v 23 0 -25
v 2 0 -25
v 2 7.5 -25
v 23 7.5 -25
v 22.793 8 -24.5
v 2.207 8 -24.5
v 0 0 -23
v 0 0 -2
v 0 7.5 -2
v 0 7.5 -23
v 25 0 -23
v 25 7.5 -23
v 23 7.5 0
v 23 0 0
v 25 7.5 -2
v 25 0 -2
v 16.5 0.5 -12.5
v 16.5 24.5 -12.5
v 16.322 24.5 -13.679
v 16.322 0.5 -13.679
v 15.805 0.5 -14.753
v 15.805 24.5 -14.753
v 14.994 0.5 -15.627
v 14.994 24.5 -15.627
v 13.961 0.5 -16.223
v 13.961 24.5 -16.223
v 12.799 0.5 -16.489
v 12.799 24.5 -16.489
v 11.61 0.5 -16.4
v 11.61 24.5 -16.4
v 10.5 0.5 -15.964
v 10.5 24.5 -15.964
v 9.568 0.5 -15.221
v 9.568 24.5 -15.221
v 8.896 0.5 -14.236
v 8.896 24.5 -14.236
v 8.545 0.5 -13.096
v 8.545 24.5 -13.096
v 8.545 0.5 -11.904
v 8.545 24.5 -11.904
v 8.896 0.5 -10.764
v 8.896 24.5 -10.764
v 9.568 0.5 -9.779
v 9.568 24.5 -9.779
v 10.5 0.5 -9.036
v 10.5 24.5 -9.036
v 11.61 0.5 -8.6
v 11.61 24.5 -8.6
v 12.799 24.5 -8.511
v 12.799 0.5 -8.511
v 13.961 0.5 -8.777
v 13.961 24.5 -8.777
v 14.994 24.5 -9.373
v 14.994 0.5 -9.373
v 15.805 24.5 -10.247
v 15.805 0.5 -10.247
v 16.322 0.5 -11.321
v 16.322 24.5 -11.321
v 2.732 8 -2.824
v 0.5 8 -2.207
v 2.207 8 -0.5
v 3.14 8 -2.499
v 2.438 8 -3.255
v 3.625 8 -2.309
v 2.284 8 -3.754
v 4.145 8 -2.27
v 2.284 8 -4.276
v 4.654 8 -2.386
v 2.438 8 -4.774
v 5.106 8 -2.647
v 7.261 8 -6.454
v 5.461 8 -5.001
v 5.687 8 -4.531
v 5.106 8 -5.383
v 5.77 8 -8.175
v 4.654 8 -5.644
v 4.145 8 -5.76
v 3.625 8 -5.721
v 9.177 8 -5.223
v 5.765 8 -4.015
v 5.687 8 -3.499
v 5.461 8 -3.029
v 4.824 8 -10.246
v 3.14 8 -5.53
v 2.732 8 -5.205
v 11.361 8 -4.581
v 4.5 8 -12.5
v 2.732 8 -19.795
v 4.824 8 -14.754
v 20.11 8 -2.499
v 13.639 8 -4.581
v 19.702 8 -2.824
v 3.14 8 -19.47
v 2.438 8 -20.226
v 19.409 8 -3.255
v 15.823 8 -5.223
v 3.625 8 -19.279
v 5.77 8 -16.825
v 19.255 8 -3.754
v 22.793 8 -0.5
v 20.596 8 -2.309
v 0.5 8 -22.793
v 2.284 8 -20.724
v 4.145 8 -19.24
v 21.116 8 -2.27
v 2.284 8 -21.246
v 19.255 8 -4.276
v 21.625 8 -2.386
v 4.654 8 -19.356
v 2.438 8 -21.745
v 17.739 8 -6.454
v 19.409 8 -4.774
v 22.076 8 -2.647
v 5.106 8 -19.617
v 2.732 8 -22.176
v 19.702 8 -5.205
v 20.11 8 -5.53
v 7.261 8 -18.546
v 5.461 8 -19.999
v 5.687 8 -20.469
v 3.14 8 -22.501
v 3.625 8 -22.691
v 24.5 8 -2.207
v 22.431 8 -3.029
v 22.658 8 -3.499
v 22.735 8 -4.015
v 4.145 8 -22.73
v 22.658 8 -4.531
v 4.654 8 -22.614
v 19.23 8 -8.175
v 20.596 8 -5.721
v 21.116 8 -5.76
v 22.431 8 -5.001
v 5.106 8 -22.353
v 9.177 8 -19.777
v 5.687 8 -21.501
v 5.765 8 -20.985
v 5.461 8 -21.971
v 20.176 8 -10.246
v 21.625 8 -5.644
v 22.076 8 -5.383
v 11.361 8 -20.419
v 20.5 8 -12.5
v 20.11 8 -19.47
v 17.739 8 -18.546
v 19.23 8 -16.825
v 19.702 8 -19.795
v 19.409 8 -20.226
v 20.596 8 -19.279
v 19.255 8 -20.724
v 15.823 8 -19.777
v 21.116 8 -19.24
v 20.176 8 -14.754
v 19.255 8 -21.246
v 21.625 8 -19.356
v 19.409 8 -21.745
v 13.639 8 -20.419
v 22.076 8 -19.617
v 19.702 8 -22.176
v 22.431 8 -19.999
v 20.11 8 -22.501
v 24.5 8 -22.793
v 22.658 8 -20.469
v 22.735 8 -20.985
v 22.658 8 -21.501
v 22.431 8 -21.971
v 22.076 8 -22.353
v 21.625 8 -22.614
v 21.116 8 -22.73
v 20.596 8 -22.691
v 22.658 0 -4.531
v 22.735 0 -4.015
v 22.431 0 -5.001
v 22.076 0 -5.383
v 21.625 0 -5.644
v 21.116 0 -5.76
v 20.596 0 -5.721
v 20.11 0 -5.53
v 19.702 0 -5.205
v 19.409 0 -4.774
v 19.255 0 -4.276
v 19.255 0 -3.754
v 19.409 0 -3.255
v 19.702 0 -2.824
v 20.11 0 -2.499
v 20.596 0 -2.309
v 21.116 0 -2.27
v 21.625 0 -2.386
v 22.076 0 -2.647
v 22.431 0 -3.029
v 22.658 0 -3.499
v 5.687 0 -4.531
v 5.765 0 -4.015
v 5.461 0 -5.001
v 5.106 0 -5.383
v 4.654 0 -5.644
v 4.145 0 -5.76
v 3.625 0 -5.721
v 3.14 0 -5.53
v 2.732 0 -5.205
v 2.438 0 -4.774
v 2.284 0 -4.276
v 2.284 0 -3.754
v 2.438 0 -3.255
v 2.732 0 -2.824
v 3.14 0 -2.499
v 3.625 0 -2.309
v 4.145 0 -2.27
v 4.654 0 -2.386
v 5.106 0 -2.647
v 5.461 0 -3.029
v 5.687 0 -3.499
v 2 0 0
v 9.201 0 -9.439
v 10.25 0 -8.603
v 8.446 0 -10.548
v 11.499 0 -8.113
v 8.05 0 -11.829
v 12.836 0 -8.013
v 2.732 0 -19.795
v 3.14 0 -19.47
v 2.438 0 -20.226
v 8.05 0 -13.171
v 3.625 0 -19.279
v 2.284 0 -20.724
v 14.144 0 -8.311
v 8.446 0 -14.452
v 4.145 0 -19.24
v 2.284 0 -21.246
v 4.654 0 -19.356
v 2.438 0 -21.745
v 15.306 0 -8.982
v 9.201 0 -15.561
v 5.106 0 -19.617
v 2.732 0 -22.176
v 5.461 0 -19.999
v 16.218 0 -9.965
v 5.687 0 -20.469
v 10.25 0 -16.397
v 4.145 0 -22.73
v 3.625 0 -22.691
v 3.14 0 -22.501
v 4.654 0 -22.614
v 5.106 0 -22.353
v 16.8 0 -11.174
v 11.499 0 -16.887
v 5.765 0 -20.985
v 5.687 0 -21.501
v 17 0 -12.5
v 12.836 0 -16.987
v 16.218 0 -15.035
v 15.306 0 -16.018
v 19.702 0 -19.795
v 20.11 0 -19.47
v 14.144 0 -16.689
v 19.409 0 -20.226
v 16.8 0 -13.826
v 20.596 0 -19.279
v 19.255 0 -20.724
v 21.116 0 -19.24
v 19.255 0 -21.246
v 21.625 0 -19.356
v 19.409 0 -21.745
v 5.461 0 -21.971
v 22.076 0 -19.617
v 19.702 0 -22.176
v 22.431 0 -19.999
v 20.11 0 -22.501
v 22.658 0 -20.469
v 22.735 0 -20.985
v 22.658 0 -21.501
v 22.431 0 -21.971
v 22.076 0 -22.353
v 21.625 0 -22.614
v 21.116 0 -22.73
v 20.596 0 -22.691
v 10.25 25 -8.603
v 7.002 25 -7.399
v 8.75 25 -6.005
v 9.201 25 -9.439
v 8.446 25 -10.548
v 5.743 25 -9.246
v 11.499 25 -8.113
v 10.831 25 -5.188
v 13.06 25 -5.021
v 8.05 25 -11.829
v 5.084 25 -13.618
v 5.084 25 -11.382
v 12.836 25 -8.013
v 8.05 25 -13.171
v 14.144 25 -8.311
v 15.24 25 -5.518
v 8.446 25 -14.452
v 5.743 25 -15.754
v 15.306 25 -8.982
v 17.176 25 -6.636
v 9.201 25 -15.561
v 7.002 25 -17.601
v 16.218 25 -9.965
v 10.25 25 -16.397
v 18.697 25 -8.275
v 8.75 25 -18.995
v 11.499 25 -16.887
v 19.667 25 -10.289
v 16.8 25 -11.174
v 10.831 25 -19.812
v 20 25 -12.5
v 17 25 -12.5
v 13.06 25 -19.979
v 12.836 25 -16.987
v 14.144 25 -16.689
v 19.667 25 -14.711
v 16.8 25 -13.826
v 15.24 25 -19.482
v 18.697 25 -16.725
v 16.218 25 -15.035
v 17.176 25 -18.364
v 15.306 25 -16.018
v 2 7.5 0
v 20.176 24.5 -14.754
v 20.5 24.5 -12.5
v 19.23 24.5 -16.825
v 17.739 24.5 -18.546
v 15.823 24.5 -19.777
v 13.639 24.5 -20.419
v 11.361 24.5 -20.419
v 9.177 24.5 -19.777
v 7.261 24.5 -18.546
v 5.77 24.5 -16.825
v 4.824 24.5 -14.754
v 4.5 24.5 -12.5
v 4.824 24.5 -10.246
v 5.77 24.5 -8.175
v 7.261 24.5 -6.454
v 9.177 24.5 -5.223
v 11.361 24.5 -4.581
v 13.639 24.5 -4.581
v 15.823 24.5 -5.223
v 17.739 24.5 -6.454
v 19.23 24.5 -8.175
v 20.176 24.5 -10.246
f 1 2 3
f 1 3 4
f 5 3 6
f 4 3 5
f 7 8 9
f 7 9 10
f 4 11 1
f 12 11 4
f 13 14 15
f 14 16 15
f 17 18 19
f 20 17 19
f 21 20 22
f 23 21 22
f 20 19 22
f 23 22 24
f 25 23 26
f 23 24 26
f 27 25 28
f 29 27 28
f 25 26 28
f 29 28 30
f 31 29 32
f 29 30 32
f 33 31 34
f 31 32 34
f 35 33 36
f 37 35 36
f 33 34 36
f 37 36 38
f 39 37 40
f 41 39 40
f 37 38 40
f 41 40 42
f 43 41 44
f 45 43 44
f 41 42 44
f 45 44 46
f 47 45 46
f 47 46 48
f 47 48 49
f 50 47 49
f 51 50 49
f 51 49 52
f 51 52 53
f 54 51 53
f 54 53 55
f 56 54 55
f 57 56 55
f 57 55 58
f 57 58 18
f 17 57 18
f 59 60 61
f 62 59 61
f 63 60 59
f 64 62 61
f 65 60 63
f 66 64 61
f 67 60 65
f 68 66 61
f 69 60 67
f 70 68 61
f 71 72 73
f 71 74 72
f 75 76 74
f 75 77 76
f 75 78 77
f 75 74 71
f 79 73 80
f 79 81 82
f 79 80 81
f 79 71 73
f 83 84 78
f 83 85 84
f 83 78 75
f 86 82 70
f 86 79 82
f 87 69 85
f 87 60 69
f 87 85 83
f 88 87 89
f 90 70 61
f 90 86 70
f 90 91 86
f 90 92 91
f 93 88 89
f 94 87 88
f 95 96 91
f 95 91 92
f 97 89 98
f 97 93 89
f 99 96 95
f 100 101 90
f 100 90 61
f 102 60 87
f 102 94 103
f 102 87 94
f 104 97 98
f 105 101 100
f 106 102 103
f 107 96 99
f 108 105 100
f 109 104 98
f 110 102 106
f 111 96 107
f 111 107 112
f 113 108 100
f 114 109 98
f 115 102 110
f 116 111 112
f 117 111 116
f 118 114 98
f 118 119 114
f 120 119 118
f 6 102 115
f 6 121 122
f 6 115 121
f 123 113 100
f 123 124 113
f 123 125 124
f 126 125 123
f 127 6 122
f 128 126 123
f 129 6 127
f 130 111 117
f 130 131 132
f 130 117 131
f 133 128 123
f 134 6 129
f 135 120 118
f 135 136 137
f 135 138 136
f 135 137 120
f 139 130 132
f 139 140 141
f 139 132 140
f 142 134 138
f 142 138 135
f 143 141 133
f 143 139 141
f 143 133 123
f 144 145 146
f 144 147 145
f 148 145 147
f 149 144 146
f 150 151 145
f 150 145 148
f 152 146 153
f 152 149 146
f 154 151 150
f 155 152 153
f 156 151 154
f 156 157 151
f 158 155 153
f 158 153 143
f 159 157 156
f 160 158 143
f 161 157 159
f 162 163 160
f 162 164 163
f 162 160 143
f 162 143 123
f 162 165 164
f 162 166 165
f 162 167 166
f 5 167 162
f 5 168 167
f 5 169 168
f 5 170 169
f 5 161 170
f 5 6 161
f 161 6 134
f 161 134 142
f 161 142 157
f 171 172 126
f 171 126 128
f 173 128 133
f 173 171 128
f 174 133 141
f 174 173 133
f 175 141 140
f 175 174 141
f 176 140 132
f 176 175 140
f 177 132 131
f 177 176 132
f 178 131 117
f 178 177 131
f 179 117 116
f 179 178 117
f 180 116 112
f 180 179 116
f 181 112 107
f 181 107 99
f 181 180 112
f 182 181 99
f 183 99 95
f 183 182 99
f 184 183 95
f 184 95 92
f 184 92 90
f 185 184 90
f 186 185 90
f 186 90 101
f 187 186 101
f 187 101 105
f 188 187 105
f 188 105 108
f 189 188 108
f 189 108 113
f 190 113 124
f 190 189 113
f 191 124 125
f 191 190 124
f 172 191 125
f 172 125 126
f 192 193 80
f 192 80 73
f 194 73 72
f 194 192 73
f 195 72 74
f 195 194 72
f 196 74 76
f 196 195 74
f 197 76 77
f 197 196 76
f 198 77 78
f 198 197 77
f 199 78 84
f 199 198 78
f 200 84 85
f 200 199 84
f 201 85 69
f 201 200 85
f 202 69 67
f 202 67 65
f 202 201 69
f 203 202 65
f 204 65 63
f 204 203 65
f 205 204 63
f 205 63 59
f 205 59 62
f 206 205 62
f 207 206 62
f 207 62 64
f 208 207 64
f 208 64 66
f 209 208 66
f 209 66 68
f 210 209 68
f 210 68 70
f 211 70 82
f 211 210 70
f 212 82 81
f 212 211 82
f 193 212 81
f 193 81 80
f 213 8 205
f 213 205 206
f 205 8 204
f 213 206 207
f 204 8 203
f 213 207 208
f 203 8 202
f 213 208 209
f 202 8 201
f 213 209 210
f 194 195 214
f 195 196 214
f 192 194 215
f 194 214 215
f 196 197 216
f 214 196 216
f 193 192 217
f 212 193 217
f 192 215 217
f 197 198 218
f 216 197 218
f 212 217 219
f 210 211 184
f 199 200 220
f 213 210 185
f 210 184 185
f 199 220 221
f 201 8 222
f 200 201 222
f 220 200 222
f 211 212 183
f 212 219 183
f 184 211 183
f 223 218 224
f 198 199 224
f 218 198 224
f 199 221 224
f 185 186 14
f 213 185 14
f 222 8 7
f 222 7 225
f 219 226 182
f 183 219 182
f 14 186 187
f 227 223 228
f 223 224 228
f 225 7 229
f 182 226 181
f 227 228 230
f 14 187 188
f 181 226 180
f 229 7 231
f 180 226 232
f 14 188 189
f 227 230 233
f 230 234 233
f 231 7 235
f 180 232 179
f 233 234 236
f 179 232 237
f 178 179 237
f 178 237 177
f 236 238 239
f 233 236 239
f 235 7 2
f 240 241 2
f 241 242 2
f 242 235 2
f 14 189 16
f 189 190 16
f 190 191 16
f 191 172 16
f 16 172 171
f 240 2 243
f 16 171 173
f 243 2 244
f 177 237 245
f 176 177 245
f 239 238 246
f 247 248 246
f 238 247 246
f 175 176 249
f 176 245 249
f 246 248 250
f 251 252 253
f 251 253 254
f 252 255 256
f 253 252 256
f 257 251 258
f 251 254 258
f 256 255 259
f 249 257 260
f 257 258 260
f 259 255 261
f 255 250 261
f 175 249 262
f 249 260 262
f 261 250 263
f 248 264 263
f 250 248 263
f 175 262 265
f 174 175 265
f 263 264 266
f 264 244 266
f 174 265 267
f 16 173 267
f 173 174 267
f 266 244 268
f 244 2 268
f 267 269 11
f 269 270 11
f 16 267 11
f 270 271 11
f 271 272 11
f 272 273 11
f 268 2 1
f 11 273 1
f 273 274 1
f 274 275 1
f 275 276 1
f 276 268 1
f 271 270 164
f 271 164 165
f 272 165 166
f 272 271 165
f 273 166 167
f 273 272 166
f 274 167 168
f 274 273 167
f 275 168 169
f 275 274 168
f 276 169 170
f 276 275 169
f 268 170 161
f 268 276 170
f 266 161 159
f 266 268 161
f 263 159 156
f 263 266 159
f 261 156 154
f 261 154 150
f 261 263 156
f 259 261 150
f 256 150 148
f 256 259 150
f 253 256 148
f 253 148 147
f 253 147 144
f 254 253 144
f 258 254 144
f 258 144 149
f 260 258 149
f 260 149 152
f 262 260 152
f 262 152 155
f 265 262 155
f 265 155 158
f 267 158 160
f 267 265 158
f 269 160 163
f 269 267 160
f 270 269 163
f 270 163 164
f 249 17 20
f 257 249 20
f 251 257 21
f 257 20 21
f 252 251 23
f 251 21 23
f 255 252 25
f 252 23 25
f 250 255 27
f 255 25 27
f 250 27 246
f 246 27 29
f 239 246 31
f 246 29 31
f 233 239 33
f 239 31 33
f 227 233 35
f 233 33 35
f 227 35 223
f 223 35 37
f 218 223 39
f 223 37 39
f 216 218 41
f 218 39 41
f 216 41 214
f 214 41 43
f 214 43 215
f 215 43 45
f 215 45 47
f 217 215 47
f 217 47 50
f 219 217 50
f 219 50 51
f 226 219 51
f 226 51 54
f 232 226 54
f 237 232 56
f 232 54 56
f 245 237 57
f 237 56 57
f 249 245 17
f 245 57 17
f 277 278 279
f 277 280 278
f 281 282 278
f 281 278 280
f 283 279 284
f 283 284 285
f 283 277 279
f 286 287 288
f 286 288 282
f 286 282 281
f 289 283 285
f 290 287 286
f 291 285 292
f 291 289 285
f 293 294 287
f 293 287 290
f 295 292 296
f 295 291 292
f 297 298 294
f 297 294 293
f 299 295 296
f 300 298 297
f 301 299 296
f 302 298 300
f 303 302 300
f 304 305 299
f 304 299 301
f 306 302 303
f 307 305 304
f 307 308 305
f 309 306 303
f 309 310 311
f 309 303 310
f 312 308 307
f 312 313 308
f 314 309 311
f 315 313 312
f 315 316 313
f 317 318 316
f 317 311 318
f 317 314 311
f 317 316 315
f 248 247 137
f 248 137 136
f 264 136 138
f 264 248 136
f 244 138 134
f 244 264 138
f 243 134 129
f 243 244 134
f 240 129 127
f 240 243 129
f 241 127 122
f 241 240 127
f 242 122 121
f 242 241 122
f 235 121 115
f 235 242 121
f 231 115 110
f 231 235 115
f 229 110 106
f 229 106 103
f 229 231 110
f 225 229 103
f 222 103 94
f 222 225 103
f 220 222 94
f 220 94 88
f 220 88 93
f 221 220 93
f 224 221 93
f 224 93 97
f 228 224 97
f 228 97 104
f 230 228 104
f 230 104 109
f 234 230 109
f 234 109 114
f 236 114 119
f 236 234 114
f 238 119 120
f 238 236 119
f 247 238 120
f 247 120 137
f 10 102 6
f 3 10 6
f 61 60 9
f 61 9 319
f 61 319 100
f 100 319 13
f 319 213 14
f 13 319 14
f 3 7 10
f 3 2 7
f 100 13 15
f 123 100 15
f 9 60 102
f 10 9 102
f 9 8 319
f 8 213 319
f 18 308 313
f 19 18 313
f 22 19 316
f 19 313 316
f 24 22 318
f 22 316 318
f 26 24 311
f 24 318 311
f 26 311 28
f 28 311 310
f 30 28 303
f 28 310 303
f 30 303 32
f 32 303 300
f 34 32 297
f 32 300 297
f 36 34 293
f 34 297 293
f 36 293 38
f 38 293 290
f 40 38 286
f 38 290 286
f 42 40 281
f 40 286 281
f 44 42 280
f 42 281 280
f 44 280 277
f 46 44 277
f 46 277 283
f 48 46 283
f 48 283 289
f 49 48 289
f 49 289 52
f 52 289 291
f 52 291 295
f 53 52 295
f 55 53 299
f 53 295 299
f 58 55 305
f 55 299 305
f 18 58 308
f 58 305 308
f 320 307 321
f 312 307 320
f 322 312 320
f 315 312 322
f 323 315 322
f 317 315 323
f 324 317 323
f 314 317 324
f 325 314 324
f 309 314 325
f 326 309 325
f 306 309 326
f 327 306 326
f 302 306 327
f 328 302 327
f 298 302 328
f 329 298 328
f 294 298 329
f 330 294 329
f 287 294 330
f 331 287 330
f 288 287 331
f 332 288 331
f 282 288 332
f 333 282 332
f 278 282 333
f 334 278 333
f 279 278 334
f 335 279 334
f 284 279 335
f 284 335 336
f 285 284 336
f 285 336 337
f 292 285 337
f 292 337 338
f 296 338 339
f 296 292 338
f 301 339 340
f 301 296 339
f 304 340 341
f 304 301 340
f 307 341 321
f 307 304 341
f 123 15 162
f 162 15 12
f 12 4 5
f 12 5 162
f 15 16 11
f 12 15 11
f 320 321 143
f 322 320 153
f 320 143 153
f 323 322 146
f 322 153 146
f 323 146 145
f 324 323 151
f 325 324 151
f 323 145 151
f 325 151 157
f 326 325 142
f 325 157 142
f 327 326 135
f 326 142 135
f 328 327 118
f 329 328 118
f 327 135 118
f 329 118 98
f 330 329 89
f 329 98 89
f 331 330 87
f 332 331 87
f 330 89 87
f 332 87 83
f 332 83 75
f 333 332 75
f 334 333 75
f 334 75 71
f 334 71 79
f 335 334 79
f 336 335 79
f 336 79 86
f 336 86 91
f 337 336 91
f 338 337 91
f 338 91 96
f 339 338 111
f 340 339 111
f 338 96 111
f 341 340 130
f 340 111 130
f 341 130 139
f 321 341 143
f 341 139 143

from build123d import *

# Parameters (mm, degrees)
ESQUISSE1_W      = 25
ESQUISSE1_H      = 25
ESQUISSE1_R      = 1.75
EXTRUSION1_DEPTH = 8
ESQUISSE2_R      = 8
EXTRUSION2_DEPTH = 17
CHANFREIN1_SIZE  = 2
EXTRUSION3_REACH = 27
ESQUISSE3_R      = 4
CHANFREIN2_SIZE  = 0.5


with BuildPart() as part:
    # Esquisse1 → Extrusion1 (new body)
    with BuildSketch(Plane(origin=(0, 0, 0), x_dir=(1, 0, 0), z_dir=(0, 1, 0))):
        with Locations((12.5, 12.5)):
            Rectangle(ESQUISSE1_W, ESQUISSE1_H)
        with Locations((4.014718626, 20.985281374)):
            Circle(ESQUISSE1_R, mode=Mode.SUBTRACT)
        with Locations((20.985281374, 20.985281374)):
            Circle(ESQUISSE1_R, mode=Mode.SUBTRACT)
        with Locations((20.985281374, 4.014718626)):
            Circle(ESQUISSE1_R, mode=Mode.SUBTRACT)
        with Locations((4.014718626, 4.014718626)):
            Circle(ESQUISSE1_R, mode=Mode.SUBTRACT)
    extrude(amount=EXTRUSION1_DEPTH)

    # Esquisse2 → Extrusion2 (add)
    with BuildSketch(Plane(origin=(0, 8, 0), x_dir=(1, 0, 0), z_dir=(0, 1, 0))):
        with Locations((12.5, 12.5)):
            Circle(ESQUISSE2_R)
    extrude(amount=EXTRUSION2_DEPTH)

    # Chanfrein1
    chanfrein1_edges = [part.edges().sort_by_distance(p)[0] for p in [
        (0, 4, -25),
        (25, 4, -25),
        (25, 4, 0),
        (0, 4, 0),
    ]]
    chamfer(chanfrein1_edges, length=CHANFREIN1_SIZE)

    # Esquisse3 → Extrusion3 (cut, up to next)
    with BuildSketch(Plane(origin=(0, 25, 0), x_dir=(1, 0, 0), z_dir=(0, 1, 0)), mode=Mode.PRIVATE) as extrusion3_sk1:
        with Locations((12.5, 12.5)):
            Circle(ESQUISSE3_R)
    extrusion3_tool1 = extrude(extrusion3_sk1.sketch, amount=-EXTRUSION3_REACH, mode=Mode.PRIVATE) & part.part
    add(extrusion3_tool1.solids().sort_by_distance((12.5, 25, -12.5))[0], mode=Mode.SUBTRACT)

    # Chanfrein2
    chanfrein2_edges = [part.edges().sort_by_distance(p)[0] for p in [
        (4.5, 25, -12.5),
        (0, 8, -12.5),
        (12.5, 8, -25),
        (12.5, 8, 0),
        (25, 8, -12.5),
        (1, 8, -1),
        (24, 8, -1),
        (24, 8, -24),
        (1, 8, -24),
        (8.5, 0, -12.5),
        (8.5, 25, -12.5),
    ]]
    chamfer(chanfrein2_edges, length=CHANFREIN2_SIZE)


solid = part.part
